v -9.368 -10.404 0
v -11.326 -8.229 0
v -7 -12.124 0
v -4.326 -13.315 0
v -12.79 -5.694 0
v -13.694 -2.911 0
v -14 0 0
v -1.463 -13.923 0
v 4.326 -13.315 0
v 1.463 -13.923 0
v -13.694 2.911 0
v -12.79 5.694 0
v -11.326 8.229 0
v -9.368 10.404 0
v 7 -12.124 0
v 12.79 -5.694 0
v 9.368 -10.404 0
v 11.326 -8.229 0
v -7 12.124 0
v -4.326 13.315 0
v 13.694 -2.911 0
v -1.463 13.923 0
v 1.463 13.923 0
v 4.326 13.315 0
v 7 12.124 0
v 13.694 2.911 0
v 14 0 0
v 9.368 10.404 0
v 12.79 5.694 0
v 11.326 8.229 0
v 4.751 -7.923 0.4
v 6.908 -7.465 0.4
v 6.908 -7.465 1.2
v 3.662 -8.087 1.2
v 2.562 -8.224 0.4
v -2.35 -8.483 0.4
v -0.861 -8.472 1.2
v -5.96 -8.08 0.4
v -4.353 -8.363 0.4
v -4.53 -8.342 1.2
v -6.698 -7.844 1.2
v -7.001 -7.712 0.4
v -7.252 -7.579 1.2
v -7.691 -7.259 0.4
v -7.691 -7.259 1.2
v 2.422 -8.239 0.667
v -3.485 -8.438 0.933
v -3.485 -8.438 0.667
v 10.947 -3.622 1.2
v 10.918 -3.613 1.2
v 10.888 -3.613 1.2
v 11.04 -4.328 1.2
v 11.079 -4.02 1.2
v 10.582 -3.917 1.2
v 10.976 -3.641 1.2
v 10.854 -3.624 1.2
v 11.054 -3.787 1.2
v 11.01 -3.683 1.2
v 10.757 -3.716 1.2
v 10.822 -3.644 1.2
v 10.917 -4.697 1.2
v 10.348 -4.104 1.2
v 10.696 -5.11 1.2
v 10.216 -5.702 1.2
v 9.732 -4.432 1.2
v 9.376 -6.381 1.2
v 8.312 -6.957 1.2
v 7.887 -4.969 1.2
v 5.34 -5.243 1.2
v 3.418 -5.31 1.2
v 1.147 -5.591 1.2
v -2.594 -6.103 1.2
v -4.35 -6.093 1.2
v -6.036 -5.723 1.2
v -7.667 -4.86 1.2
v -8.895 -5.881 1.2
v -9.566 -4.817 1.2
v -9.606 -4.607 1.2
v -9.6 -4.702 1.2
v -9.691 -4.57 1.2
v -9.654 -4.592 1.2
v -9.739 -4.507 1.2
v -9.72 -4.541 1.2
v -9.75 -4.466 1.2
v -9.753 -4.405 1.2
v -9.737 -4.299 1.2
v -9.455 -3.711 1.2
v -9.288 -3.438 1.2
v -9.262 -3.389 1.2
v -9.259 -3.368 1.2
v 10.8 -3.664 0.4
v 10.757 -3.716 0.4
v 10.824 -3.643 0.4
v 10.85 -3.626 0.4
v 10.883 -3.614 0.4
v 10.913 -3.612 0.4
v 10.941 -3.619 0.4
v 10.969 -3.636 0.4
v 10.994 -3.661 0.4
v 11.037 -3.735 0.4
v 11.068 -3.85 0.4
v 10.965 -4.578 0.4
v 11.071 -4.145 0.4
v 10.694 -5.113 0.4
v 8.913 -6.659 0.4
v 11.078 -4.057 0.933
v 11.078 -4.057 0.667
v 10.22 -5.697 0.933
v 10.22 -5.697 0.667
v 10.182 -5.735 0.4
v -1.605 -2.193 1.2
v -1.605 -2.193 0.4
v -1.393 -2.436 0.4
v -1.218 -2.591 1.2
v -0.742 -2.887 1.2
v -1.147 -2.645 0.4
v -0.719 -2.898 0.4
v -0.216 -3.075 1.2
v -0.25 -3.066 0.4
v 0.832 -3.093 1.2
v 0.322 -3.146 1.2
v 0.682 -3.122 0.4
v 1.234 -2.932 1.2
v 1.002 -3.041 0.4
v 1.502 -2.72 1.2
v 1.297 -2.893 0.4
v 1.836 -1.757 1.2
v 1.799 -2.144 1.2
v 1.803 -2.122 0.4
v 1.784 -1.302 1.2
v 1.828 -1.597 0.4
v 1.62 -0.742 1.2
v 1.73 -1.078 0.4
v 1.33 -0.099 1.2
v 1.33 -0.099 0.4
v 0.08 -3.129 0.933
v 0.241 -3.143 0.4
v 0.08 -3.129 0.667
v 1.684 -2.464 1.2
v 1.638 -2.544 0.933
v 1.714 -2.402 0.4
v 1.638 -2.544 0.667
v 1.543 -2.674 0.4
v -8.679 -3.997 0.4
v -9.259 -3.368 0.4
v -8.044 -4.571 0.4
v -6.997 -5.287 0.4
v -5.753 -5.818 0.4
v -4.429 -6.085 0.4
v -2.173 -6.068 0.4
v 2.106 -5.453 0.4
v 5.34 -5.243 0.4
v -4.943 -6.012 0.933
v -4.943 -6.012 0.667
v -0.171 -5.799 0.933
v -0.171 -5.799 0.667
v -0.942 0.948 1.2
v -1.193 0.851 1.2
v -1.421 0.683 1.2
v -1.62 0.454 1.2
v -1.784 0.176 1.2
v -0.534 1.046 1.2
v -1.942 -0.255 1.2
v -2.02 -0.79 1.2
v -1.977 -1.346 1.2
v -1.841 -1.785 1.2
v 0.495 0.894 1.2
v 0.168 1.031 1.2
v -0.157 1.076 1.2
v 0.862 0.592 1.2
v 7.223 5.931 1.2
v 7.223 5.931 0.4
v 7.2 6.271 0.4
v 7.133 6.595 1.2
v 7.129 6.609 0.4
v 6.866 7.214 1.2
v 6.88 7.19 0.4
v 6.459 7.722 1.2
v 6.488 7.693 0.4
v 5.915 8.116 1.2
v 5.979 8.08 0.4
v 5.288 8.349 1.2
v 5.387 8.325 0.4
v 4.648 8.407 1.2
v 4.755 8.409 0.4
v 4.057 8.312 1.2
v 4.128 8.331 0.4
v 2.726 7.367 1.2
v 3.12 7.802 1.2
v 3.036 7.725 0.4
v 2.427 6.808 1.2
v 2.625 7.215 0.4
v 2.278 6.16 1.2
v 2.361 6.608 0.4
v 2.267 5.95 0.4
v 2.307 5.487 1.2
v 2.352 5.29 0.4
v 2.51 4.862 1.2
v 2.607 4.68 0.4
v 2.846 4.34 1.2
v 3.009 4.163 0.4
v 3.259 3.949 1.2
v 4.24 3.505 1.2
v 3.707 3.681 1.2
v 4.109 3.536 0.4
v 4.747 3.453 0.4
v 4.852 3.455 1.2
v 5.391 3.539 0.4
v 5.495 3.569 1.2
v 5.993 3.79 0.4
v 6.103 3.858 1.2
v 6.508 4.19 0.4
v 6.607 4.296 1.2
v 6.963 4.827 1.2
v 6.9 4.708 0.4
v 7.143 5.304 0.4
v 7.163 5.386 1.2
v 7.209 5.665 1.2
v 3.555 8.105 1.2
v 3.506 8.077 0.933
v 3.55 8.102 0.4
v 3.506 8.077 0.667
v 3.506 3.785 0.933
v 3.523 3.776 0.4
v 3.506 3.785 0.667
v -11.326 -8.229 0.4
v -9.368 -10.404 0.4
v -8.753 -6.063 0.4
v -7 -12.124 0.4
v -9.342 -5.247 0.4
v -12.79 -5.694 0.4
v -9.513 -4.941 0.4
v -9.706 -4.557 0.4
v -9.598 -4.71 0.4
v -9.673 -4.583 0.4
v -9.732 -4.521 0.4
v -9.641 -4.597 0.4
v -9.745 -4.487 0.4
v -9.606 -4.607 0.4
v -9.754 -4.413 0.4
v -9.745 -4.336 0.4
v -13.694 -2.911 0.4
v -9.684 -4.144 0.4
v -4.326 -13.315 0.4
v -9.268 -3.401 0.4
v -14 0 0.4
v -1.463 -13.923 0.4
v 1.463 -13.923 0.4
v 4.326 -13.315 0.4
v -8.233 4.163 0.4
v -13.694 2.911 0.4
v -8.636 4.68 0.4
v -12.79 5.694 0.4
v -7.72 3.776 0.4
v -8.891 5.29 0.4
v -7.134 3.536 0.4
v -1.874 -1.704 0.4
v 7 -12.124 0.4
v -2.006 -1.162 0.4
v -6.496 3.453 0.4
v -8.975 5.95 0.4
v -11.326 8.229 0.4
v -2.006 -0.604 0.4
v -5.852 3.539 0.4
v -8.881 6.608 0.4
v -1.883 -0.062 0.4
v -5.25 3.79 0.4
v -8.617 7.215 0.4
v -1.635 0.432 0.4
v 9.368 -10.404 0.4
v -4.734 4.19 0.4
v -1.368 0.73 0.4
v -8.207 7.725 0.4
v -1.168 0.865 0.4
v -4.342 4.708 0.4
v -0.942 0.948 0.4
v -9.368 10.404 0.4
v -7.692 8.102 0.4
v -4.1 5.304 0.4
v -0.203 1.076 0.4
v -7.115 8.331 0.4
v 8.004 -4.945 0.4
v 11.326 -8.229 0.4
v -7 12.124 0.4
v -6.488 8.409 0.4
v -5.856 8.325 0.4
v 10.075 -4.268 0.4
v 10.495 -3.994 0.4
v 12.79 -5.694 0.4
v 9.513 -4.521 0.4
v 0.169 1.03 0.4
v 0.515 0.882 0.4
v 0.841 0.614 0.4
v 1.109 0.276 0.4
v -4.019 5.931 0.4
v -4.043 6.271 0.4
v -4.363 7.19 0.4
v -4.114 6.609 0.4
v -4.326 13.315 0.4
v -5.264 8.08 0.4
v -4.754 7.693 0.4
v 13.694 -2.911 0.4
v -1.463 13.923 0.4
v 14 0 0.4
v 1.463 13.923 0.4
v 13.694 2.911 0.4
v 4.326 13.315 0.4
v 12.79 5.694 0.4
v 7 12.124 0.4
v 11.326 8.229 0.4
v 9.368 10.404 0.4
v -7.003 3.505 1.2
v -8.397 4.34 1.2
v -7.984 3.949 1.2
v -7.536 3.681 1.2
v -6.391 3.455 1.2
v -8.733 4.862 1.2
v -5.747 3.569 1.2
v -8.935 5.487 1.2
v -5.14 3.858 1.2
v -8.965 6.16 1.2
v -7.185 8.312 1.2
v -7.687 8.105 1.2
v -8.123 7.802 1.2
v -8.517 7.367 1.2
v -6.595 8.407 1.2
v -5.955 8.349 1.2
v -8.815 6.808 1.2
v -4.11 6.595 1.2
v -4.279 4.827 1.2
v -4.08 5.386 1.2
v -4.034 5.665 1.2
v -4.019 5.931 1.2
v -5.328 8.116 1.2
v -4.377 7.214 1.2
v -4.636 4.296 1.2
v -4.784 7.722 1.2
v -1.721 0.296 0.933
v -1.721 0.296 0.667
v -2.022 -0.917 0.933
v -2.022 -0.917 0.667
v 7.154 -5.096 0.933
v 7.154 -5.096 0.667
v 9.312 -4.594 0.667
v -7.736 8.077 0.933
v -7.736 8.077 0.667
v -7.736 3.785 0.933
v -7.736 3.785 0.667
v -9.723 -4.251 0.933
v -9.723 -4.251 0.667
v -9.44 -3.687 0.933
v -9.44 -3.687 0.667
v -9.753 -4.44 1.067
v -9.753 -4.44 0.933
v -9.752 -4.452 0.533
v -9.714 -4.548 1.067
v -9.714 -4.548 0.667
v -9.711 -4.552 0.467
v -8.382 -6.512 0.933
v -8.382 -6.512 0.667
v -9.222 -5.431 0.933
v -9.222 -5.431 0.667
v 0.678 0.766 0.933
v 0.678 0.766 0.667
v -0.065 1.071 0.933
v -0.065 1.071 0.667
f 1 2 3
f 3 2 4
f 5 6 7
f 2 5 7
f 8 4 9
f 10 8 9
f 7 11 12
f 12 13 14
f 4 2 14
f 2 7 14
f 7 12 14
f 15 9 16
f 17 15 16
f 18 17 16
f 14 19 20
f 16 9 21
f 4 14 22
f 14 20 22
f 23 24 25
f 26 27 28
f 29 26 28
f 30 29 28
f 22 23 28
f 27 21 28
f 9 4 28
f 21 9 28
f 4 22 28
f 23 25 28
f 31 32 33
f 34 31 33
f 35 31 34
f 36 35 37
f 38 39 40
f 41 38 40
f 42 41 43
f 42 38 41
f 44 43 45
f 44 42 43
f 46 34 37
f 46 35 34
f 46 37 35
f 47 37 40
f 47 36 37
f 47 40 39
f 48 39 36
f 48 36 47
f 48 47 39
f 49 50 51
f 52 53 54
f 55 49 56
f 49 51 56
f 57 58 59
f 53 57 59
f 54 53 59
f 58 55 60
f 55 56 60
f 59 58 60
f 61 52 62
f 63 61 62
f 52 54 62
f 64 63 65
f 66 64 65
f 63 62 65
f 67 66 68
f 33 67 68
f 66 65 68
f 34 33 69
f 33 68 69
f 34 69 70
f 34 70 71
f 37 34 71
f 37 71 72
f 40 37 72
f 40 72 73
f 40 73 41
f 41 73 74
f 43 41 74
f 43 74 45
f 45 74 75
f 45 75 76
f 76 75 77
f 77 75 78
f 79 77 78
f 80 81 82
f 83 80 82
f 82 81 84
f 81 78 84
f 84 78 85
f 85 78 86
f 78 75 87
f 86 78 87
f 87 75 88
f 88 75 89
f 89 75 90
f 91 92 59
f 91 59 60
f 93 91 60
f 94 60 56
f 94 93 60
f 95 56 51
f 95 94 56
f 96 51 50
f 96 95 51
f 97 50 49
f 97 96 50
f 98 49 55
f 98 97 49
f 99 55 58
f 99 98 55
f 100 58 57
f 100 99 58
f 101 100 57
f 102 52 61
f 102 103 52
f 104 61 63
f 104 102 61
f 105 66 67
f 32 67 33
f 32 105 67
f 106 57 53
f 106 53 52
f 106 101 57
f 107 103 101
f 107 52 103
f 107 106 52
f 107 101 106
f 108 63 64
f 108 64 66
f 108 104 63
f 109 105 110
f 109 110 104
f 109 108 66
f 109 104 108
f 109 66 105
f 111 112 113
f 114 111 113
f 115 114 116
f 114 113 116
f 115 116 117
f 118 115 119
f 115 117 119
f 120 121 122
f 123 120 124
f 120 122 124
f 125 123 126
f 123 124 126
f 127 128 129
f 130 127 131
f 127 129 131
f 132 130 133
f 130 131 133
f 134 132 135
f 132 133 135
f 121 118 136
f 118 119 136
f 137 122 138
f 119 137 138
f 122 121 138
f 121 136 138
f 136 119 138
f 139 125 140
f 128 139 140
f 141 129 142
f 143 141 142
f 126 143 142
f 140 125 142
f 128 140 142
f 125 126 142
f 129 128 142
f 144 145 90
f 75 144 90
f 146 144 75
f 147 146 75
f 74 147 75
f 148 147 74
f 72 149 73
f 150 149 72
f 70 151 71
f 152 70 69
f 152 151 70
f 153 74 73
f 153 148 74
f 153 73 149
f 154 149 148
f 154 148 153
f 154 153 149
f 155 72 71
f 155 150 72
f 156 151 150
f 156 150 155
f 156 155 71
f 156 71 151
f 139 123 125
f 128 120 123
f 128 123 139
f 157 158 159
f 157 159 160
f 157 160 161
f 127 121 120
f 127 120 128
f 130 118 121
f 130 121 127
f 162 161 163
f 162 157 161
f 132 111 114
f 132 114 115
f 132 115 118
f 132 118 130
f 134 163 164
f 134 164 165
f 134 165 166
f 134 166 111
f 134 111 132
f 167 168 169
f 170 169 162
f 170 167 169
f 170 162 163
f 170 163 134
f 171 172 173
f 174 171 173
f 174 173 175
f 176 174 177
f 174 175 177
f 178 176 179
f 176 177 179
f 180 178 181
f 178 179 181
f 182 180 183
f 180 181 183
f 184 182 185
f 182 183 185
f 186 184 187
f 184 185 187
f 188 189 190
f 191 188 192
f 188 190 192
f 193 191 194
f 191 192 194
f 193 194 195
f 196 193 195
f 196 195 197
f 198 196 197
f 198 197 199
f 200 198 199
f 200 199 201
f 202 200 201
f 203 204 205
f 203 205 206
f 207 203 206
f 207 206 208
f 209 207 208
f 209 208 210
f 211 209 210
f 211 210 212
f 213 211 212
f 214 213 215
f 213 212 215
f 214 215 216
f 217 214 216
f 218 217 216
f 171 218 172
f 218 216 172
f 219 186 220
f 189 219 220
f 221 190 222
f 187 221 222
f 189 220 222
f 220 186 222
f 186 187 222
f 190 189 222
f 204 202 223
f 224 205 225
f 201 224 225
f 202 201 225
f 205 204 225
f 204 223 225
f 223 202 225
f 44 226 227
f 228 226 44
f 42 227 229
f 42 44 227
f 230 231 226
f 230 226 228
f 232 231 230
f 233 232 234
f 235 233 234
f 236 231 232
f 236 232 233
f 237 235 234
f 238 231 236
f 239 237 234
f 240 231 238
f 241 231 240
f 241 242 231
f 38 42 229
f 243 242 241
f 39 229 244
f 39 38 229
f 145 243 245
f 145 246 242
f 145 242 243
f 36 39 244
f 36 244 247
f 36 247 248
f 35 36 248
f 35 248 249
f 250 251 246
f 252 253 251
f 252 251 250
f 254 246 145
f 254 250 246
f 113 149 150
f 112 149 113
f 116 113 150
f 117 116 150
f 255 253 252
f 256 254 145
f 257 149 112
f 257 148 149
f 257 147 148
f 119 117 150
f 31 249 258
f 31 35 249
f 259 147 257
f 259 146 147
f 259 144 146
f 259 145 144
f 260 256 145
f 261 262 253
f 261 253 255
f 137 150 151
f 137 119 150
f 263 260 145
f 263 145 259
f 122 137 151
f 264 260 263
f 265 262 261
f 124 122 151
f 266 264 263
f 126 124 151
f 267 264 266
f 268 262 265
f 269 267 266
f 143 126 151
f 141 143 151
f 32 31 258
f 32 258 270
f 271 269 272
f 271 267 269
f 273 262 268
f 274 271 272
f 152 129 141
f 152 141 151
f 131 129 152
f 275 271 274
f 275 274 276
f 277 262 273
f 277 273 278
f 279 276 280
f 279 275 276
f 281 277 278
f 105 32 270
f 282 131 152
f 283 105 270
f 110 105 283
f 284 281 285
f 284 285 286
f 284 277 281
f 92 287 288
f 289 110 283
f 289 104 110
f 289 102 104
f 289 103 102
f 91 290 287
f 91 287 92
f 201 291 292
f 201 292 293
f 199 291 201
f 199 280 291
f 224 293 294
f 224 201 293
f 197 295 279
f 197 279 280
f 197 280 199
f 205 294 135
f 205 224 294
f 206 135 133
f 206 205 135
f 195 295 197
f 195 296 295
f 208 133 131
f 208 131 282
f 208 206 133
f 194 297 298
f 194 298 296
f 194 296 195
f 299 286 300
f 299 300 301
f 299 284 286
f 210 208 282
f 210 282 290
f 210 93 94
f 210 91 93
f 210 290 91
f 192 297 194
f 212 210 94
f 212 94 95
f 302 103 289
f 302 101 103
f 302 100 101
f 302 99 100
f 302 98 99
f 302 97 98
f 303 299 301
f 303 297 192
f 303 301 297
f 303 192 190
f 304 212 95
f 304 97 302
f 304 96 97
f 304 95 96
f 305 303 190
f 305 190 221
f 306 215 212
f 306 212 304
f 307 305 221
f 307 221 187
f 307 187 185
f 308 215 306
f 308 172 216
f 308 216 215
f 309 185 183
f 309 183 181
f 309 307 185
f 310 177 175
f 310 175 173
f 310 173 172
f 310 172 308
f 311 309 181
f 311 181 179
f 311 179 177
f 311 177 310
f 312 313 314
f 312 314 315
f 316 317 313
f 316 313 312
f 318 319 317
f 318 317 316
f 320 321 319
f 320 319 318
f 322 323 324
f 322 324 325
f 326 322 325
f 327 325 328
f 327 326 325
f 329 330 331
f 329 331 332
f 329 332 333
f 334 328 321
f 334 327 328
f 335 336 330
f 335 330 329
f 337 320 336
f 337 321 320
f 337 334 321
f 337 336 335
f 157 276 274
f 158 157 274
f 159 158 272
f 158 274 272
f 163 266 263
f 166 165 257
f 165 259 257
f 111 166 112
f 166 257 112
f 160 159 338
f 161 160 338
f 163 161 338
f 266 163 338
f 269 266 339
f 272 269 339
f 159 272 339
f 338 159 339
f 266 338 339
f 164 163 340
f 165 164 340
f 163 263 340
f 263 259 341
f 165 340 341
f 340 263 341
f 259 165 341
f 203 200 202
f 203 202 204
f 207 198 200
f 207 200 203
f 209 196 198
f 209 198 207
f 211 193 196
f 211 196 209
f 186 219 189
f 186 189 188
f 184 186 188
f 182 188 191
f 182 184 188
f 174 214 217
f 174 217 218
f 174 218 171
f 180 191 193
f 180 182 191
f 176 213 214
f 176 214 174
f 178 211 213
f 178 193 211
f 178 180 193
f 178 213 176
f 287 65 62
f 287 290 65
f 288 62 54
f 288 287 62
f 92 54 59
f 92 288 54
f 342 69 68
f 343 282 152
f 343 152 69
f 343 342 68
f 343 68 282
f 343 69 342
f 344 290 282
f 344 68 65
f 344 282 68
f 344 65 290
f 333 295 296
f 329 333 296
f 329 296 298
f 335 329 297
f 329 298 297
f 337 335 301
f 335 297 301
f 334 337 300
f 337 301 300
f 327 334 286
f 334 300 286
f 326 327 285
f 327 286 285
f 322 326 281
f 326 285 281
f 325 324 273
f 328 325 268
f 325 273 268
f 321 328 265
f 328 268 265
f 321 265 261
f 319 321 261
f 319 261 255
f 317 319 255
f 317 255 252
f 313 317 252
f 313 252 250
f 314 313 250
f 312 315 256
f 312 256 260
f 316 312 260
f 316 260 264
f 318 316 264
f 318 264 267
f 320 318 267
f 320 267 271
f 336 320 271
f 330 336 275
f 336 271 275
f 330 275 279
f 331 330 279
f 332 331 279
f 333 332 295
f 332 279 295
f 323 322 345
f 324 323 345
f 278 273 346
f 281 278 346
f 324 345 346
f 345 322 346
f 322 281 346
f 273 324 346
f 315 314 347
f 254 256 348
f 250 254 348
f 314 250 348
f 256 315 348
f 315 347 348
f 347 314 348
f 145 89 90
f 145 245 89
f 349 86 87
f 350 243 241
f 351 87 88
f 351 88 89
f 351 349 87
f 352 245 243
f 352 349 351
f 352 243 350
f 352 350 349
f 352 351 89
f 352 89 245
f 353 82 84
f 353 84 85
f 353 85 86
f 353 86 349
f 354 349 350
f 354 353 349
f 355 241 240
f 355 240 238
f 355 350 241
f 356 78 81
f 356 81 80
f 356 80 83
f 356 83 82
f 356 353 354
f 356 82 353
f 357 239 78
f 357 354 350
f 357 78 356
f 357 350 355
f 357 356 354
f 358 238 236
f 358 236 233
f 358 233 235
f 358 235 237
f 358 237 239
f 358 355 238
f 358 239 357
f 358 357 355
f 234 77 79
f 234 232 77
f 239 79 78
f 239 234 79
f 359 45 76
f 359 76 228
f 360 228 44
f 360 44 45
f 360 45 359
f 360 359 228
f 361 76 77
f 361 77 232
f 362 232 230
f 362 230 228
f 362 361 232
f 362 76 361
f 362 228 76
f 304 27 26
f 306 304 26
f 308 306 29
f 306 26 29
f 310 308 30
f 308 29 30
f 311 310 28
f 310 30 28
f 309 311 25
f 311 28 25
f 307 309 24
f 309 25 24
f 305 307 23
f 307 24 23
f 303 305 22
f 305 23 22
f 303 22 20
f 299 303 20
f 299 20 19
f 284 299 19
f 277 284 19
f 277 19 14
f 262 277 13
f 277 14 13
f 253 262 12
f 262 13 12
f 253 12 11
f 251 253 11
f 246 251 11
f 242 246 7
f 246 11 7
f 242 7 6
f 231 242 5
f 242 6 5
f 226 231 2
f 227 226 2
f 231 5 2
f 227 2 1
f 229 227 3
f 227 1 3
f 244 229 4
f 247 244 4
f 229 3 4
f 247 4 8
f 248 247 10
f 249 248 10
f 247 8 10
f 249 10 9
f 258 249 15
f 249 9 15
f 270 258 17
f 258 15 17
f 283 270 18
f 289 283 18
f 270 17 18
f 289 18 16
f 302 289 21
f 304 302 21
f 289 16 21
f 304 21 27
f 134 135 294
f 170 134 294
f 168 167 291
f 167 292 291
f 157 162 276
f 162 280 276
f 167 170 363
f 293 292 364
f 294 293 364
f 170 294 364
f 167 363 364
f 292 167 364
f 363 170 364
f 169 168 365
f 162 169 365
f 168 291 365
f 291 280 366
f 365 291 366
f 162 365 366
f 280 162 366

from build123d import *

# Parameters (mm, degrees)
SKETCH_R     = 14
PAD_DEPTH    = 0.4
PAD001_DEPTH = 1.2


with BuildPart() as part:
    # Sketch → Pad (new body)
    with BuildSketch(Plane.XY):
        Circle(SKETCH_R)
    extrude(amount=PAD_DEPTH)

    # Clone2D → Pad001 (join)
    with BuildSketch(Plane(origin=(-15.3624, 20.0267, 0), x_dir=(1, 0, 0), z_dir=(0, 0, 1))):
        with BuildLine():
            add(Edge.make_bspline(
                [(11.343132, -14.095476), (11.343132, -9.803413), (7.626096, -11.949444), (3.90906, -14.095476), (7.626096, -16.241508), (11.343132, -18.387539), (11.343132, -14.095476)],
                knots=[0, 0, 0, 2.094395, 2.094395, 4.18879, 4.18879, 6.283185, 6.283185, 6.283185], degree=2, weights=[1, 0.5, 1, 0.5, 1, 0.5, 1]))
        make_face()
        with BuildLine():
            add(Edge.make_bspline(
                [(14.420088, -19.078956), (13.482828, -19.284696), (12.902184, -21.07692), (13.757148, -22.21992)],
                knots=[0, 0, 0, 0, 1, 1, 1, 1], degree=3))
            add(Edge.make_bspline(
                [(13.757148, -22.21992), (14.92758, -23.801832), (18.512028, -23.61438), (16.692372, -20.125944)],
                knots=[0, 0, 0, 0, 1, 1, 1, 1], degree=3))
            add(Edge.make_bspline(
                [(16.692372, -20.125944), (16.07058, -18.937224), (15.380208, -18.786348), (14.420088, -19.078956)],
                knots=[0, 0, 0, 0, 1, 1, 1, 1], degree=3))
        make_face()
        with BuildLine():
            add(Edge.make_bspline(
                [(22.58568, -14.095476), (22.58568, -9.803413), (18.868644, -11.949444), (15.151608, -14.095476), (18.868644, -16.241508), (22.58568, -18.387539), (22.58568, -14.095476)],
                knots=[0, 0, 0, 2.094395, 2.094395, 4.18879, 4.18879, 6.283185, 6.283185, 6.283185], degree=2, weights=[1, 0.5, 1, 0.5, 1, 0.5, 1]))
        make_face()
        with BuildLine():
            add(Edge.make_bspline(
                [(6.10362, -23.394924), (10.287, -28.305252), (14.726412, -25.159716), (20.702016, -25.269444)],
                knots=[0, 0, 0, 0, 1, 1, 1, 1], degree=3))
            add(Edge.make_bspline(
                [(20.702016, -25.269444), (21.99132, -25.292304), (25.383744, -24.816816), (26.119836, -23.742396)],
                knots=[0, 0, 0, 0, 1, 1, 1, 1], degree=3))
            add(Edge.make_bspline(
                [(26.119836, -23.742396), (26.604468, -23.04288), (27.235404, -26.051256), (22.270212, -27.491436)],
                knots=[0, 0, 0, 0, 1, 1, 1, 1], degree=3))
            add(Edge.make_bspline(
                [(22.270212, -27.491436), (19.536156, -28.286964), (9.985248, -29.42082), (7.671816, -27.285696)],
                knots=[0, 0, 0, 0, 1, 1, 1, 1], degree=3))
            add(Edge.make_bspline(
                [(7.671816, -27.285696), (7.255764, -26.901648), (5.710428, -25.132284), (5.756148, -24.633936)],
                knots=[0, 0, 0, 0, 1, 1, 1, 1], degree=3))
            add(Edge.make_bspline(
                [(5.756148, -24.633936), (5.271516, -24.533352), (6.140196, -23.440644), (6.10362, -23.394924)],
                knots=[0, 0, 0, 0, 1, 1, 1, 1], degree=3))
        make_face()
    extrude(amount=PAD001_DEPTH)


solid = part.part
